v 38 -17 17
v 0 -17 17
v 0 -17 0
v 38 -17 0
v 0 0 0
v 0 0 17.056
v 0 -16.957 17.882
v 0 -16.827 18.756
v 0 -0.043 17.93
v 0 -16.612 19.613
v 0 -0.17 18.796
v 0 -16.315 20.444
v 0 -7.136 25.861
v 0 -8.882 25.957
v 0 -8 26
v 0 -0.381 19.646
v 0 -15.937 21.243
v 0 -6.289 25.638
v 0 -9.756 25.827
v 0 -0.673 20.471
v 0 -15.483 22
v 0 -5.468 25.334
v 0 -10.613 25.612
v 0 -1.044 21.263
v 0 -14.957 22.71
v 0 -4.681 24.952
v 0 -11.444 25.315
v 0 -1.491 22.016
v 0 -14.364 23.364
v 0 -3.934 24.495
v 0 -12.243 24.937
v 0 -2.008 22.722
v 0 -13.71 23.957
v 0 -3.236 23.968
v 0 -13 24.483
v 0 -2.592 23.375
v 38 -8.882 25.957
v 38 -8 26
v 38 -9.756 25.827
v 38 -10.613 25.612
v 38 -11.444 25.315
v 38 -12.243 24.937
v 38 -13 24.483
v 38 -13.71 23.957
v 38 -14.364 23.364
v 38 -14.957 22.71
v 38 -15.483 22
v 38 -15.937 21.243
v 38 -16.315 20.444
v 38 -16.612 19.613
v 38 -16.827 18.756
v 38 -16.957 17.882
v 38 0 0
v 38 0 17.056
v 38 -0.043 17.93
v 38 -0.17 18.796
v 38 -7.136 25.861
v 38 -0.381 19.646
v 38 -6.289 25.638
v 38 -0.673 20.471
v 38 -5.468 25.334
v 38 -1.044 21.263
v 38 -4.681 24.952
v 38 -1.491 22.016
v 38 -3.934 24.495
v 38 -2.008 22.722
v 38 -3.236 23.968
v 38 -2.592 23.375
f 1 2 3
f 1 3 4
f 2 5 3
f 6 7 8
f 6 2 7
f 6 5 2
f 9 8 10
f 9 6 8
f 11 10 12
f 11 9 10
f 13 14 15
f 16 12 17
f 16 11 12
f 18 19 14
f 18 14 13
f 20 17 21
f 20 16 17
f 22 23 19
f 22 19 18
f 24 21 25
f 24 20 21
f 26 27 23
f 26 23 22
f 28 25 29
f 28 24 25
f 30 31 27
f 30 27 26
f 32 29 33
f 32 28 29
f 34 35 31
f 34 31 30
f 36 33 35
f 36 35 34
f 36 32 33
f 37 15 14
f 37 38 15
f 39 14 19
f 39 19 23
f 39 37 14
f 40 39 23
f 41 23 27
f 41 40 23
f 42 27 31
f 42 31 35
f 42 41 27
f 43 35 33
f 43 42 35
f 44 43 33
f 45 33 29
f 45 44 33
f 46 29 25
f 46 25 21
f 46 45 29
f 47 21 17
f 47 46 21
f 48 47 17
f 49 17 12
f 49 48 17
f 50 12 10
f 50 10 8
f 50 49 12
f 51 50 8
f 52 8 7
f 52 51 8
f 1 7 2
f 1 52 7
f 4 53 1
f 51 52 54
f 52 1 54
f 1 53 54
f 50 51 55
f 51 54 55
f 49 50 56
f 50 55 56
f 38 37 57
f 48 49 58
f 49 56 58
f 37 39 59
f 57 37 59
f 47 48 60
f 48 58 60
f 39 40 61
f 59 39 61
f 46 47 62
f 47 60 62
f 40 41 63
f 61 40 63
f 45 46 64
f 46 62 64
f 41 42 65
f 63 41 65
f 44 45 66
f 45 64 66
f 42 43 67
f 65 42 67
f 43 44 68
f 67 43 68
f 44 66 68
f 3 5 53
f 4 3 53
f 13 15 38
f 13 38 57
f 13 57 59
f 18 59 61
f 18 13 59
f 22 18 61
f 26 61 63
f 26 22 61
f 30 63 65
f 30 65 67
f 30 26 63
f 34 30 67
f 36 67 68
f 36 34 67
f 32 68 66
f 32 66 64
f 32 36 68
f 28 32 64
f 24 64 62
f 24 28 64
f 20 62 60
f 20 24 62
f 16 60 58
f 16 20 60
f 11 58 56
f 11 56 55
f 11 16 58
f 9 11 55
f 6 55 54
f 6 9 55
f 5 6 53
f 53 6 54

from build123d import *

# Parameters (mm, degrees)
F0_W        = 38
F0_H        = 26
F1_DEPTH    = 17
F2_R        = 9
F3_T1_DEPTH = 82.72135955


# Not quite as in the source:
# - a fillet or chamfer that OpenCascade refuses, or shapes differently, is made with other operations: its cross-section is extruded or revolved along the edge and cut away or added


with BuildPart() as f1:
    # F0 (on Front) → F1 (new body)
    with BuildSketch(Plane.XZ):
        with Locations((19, 13)):
            Rectangle(F0_W, F0_H)
    extrude(amount=F1_DEPTH)

    # F2
    f2_edges = [f1.edges().sort_by_distance(p)[0] for p in [
        (19, -17, 26),
    ]]
    fillet(f2_edges, radius=F2_R)

    # F3: fillet of radius 9 on 1 edges, made by hand

    # F3_s2 → F3_t1 (cut)
    with BuildSketch(Plane.YZ.offset(-22.360679775)):
        with BuildLine():
            ThreePointArc((-8, 26), (-2.2917960675, 23.05572809), (0, 17.05572809))
            Line((0, 17.05572809), (0, 26))
            Line((0, 26), (-8, 26))
        make_face()
    extrude(amount=F3_T1_DEPTH, mode=Mode.SUBTRACT)


solid = f1.part
